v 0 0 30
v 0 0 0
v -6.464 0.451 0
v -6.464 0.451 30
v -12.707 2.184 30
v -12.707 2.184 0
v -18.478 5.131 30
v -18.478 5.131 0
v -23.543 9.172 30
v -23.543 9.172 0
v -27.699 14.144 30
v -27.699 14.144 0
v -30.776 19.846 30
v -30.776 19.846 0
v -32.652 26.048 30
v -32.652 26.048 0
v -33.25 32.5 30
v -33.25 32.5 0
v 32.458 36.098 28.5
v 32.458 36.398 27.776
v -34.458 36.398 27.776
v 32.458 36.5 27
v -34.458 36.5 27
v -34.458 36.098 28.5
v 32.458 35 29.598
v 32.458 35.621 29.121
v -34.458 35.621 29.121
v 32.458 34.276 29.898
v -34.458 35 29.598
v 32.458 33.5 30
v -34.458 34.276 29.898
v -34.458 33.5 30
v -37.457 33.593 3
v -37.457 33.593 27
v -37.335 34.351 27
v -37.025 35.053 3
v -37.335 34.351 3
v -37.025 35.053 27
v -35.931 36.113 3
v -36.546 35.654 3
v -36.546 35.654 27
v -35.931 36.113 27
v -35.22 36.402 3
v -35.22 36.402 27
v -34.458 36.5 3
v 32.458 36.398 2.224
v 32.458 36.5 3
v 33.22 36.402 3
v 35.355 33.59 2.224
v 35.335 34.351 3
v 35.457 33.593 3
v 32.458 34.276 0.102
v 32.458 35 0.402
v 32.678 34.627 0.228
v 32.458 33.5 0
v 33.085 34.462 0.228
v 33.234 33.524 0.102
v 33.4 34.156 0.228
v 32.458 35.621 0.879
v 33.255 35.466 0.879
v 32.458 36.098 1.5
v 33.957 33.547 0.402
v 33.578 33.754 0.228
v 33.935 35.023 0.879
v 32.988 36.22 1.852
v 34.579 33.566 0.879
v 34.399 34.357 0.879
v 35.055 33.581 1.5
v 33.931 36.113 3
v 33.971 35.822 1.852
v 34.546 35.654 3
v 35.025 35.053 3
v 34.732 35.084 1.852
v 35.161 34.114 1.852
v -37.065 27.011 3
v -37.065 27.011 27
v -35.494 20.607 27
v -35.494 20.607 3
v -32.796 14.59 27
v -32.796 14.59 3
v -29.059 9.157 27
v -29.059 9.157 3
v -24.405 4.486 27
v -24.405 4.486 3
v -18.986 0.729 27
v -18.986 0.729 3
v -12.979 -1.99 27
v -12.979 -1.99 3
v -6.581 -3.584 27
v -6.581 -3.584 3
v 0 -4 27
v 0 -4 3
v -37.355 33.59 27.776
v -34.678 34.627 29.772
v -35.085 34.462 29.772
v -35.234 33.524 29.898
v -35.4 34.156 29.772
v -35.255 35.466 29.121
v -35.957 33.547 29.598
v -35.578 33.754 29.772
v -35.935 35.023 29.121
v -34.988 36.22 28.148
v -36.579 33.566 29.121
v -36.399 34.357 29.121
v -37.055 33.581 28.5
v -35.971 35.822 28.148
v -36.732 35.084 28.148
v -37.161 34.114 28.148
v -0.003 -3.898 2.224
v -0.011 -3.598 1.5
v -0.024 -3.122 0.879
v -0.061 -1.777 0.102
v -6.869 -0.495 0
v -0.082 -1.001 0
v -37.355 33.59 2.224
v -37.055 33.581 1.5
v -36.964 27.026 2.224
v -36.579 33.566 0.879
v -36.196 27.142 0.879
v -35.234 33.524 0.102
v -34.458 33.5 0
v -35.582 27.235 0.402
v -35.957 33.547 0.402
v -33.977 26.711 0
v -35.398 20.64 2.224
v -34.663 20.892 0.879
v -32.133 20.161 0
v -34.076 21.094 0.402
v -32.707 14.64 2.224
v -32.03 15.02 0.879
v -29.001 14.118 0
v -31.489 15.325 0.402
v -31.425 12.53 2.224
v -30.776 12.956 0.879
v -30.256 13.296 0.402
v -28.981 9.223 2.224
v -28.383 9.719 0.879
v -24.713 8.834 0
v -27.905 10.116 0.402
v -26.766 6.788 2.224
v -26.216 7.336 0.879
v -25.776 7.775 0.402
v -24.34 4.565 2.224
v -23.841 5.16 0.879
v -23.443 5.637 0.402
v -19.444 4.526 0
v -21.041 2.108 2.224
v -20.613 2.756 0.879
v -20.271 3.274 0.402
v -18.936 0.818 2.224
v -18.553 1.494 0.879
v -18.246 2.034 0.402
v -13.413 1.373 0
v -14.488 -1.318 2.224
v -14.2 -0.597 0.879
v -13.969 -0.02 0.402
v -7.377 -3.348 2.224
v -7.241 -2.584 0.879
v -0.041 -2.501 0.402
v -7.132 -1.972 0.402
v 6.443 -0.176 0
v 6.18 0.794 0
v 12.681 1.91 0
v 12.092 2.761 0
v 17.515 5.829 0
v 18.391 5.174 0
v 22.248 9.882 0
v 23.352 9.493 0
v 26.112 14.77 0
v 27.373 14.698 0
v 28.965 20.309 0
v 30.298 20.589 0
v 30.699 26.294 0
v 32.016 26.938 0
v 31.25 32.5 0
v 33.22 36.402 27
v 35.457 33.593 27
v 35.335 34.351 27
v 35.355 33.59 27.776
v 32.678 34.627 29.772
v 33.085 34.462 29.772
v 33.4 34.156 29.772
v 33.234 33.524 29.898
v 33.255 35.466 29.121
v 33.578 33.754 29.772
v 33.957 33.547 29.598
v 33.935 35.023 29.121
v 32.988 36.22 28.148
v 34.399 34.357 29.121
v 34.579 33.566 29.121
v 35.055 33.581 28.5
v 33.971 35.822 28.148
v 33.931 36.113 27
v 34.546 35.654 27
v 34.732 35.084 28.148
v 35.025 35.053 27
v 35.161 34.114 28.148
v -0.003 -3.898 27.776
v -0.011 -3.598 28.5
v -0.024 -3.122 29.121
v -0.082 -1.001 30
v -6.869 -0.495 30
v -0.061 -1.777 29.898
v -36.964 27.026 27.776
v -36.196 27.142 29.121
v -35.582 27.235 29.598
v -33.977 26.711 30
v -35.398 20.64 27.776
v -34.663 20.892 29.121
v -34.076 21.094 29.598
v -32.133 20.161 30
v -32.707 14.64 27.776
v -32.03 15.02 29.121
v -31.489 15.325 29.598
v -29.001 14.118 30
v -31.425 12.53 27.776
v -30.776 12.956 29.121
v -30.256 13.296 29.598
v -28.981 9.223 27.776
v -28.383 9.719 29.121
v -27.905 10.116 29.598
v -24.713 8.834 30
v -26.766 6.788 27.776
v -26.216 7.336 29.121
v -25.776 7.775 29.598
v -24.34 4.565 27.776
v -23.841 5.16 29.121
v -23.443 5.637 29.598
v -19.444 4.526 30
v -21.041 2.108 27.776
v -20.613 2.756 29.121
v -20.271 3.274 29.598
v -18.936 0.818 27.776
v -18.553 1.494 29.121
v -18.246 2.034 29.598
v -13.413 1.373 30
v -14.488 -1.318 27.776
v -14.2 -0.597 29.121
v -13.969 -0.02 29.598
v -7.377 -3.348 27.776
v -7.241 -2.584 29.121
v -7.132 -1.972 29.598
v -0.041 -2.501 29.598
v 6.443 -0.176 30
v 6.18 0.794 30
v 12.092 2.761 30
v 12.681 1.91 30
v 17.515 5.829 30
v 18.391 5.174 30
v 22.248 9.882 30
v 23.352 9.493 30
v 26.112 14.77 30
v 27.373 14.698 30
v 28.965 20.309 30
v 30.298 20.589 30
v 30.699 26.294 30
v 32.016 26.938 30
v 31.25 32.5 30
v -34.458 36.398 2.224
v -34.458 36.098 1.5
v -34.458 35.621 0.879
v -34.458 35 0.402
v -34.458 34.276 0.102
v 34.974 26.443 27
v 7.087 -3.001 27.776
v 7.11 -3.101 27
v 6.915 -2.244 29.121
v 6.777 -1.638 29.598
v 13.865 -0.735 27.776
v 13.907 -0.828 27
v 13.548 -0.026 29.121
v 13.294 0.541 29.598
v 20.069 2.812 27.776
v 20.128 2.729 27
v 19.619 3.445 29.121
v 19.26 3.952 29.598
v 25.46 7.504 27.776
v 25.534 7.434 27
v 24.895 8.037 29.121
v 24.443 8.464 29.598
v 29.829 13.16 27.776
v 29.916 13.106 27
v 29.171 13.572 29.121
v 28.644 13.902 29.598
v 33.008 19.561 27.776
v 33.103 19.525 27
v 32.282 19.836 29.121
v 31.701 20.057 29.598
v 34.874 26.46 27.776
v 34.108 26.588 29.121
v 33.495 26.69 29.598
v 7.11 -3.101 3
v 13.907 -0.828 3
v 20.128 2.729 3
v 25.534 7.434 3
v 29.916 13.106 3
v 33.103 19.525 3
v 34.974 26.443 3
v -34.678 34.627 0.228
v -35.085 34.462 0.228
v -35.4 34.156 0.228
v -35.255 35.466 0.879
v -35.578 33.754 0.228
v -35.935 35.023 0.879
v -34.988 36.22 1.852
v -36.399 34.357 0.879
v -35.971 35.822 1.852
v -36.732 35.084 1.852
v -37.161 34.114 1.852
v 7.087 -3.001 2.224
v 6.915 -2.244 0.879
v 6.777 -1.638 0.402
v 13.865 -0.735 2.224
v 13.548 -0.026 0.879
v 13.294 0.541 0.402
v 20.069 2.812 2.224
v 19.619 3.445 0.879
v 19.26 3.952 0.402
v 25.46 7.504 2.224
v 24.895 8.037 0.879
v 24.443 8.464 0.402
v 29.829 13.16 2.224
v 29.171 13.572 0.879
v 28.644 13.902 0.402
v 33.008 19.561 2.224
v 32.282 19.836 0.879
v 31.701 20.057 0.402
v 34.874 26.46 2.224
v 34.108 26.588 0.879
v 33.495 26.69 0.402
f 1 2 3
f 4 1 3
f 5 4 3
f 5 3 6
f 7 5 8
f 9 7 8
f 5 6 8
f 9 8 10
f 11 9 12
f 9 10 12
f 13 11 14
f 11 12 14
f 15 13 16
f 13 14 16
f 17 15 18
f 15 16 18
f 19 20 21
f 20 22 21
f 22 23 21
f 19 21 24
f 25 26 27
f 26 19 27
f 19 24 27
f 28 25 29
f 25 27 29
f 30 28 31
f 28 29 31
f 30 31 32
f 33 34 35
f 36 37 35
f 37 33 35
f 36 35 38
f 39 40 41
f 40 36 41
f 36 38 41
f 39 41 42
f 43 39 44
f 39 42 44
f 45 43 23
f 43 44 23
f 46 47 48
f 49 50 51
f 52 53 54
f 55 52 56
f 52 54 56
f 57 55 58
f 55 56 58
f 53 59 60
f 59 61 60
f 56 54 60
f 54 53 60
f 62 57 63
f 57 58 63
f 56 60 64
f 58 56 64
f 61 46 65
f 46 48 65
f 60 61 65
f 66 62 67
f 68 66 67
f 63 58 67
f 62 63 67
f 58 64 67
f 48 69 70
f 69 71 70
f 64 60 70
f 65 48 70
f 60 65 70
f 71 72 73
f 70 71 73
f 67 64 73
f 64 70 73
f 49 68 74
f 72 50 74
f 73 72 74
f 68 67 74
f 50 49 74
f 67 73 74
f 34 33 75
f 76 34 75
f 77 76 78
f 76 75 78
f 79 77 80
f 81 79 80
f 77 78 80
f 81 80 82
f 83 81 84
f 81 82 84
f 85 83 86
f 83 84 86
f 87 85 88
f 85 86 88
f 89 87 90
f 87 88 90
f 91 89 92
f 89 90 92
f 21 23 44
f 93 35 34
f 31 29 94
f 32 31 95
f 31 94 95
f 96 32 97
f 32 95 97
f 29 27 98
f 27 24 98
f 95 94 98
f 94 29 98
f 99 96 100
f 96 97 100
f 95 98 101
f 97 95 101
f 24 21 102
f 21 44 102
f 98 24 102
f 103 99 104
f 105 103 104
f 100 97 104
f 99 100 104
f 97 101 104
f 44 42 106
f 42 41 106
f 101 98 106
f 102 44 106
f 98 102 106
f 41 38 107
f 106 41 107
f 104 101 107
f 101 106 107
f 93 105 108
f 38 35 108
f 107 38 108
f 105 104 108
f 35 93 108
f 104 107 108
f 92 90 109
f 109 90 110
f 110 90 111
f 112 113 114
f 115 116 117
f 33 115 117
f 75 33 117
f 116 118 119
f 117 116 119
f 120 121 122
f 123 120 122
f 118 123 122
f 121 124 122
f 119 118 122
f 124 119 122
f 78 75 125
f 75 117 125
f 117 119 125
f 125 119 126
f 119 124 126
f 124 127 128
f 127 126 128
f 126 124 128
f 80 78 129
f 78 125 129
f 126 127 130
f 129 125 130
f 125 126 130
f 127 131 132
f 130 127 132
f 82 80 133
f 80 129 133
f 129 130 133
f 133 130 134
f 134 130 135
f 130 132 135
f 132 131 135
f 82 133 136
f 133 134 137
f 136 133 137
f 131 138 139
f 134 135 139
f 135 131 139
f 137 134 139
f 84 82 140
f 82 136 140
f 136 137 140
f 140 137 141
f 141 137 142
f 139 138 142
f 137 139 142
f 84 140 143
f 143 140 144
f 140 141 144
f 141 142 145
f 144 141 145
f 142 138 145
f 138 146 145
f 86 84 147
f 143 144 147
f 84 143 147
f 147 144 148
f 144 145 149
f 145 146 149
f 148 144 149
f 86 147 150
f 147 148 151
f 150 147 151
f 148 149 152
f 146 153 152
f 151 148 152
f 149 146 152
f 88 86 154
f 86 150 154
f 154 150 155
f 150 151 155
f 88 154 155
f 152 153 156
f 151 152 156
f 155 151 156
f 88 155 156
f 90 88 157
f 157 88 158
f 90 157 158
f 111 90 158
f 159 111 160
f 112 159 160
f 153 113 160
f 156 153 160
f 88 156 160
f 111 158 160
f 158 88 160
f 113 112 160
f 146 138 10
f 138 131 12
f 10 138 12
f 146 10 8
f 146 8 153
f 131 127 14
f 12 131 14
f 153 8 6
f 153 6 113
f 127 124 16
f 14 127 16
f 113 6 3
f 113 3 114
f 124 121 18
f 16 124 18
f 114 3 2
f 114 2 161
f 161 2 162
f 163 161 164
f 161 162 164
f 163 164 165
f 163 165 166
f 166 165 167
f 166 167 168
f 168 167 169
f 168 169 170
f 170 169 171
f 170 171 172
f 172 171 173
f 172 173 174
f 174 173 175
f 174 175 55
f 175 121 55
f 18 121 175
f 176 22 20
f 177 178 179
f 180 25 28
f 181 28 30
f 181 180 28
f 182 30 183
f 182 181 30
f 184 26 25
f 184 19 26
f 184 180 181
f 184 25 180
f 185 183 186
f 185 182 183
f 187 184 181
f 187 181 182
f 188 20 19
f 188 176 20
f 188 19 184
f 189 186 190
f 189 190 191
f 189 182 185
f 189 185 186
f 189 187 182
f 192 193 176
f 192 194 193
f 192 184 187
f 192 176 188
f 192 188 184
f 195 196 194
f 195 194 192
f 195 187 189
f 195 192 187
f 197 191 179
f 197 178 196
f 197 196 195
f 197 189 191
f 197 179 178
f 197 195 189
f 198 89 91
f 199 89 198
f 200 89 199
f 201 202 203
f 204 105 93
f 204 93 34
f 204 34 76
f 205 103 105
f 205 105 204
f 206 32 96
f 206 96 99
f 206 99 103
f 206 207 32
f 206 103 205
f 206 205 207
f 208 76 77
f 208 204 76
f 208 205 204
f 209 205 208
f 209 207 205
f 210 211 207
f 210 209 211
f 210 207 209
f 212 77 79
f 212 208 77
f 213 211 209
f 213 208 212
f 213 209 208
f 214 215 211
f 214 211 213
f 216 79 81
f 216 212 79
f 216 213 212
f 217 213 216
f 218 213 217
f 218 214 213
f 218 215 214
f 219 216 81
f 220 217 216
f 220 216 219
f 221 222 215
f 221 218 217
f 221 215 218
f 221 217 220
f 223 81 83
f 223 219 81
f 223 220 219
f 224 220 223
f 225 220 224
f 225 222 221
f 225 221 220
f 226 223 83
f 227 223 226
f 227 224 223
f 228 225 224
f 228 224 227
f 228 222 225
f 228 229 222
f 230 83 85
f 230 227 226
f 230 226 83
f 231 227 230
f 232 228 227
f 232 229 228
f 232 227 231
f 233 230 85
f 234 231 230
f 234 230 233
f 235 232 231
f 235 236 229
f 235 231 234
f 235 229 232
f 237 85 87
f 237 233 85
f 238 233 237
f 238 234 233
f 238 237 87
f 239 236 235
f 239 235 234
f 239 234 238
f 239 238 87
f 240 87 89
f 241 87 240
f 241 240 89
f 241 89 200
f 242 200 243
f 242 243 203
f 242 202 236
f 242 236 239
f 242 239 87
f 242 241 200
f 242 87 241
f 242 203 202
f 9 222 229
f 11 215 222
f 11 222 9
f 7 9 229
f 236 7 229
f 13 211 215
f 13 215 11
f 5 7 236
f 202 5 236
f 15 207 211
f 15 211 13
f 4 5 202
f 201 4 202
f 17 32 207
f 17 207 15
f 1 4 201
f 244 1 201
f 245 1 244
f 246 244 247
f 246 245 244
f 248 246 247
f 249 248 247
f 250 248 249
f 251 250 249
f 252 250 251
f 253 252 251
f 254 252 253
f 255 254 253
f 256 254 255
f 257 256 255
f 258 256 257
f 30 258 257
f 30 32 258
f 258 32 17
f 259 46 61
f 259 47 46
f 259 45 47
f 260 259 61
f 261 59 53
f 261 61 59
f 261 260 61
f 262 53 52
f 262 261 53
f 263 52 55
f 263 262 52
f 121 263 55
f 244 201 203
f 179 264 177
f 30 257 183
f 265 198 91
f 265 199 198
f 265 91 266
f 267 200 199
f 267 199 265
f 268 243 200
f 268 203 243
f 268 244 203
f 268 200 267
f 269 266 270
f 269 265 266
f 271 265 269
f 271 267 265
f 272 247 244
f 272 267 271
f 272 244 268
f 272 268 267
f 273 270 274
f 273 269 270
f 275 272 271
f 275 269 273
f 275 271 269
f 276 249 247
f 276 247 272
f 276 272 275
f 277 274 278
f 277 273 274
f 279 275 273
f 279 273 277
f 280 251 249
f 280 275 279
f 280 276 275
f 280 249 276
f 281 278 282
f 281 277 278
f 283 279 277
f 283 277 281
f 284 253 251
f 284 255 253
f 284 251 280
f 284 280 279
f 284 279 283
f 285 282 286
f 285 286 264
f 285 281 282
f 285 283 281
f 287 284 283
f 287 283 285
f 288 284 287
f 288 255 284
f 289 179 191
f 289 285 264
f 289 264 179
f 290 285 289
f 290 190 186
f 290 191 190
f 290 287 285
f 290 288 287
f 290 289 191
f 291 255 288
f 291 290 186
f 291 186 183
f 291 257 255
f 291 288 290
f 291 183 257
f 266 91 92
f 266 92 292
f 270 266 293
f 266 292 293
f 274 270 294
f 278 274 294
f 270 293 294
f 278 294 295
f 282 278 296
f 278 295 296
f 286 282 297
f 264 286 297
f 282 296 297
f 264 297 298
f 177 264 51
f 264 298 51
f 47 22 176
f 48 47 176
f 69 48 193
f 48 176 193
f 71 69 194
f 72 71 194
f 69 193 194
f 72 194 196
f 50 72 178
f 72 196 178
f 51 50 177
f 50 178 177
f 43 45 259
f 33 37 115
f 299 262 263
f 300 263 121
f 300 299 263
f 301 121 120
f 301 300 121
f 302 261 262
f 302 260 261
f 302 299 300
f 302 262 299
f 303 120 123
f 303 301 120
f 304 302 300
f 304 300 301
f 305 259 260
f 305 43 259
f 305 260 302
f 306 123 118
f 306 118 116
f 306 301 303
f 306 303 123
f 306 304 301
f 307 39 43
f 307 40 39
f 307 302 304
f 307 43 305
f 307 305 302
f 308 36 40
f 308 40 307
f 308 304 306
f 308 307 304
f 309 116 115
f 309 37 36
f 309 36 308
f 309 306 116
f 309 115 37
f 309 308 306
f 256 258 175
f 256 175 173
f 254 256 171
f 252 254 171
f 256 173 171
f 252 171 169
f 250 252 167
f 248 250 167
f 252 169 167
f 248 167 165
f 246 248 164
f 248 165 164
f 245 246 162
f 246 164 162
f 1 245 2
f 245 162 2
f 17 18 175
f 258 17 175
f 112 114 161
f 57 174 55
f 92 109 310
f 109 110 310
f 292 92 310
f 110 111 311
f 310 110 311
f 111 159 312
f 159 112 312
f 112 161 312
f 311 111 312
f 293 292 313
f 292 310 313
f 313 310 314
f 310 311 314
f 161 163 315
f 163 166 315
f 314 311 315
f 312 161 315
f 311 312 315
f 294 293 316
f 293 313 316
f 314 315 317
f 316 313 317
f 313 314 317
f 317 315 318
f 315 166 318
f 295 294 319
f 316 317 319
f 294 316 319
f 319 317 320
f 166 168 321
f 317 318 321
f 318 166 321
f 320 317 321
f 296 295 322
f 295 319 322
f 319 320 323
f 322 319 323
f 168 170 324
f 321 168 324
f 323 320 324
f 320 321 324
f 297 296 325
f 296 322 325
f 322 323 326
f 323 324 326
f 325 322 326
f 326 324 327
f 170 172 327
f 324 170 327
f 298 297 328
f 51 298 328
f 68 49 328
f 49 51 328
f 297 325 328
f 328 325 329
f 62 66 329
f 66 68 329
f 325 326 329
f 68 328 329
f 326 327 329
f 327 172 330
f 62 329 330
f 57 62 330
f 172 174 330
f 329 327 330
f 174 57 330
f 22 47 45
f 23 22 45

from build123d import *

# Parameters (mm, degrees)
F1_DEPTH = 30
F3_R     = 3


# Not quite as in the source:
# - a feature of the source that left no trace in its solid (it failed there, or was rolled back) is left out


with BuildPart() as f1:
    # F0 (on Top) → F1 (new body)
    with BuildSketch(Plane.XY):
        with BuildLine():
            ThreePointArc((-37.25, 36.5), (-27.8459144936, 7.7690354349), (0, -4))
            ThreePointArc((0, -4), (26.5127811208, 8.5143386541), (35.25, 36.5))
            Line((35.25, 36.5), (-37.25, 36.5))
        make_face()
        with BuildLine():
            ThreePointArc((0, 0), (-23.5433609961, 9.1719845194), (-33.25, 32.5))
            Line((-33.25, 32.5), (31.25, 32.5))
            ThreePointArc((31.25, 32.5), (22.2476477305, 9.8820694899), (0, 0))
        make_face(mode=Mode.SUBTRACT)
    extrude(amount=F1_DEPTH)

    # F3
    f3_edges = [f1.edges().sort_by_distance(p)[0] for p in [
        (-1, 36.5, 0),
        (-1, -4.013711, 0),
        (-37.25, 36.5, 15),
        (35.25, 36.5, 15),
        (-1, 36.5, 30),
        (-1, -4.013711, 30),
    ]]
    fillet(f3_edges, radius=F3_R)


solid = f1.part
